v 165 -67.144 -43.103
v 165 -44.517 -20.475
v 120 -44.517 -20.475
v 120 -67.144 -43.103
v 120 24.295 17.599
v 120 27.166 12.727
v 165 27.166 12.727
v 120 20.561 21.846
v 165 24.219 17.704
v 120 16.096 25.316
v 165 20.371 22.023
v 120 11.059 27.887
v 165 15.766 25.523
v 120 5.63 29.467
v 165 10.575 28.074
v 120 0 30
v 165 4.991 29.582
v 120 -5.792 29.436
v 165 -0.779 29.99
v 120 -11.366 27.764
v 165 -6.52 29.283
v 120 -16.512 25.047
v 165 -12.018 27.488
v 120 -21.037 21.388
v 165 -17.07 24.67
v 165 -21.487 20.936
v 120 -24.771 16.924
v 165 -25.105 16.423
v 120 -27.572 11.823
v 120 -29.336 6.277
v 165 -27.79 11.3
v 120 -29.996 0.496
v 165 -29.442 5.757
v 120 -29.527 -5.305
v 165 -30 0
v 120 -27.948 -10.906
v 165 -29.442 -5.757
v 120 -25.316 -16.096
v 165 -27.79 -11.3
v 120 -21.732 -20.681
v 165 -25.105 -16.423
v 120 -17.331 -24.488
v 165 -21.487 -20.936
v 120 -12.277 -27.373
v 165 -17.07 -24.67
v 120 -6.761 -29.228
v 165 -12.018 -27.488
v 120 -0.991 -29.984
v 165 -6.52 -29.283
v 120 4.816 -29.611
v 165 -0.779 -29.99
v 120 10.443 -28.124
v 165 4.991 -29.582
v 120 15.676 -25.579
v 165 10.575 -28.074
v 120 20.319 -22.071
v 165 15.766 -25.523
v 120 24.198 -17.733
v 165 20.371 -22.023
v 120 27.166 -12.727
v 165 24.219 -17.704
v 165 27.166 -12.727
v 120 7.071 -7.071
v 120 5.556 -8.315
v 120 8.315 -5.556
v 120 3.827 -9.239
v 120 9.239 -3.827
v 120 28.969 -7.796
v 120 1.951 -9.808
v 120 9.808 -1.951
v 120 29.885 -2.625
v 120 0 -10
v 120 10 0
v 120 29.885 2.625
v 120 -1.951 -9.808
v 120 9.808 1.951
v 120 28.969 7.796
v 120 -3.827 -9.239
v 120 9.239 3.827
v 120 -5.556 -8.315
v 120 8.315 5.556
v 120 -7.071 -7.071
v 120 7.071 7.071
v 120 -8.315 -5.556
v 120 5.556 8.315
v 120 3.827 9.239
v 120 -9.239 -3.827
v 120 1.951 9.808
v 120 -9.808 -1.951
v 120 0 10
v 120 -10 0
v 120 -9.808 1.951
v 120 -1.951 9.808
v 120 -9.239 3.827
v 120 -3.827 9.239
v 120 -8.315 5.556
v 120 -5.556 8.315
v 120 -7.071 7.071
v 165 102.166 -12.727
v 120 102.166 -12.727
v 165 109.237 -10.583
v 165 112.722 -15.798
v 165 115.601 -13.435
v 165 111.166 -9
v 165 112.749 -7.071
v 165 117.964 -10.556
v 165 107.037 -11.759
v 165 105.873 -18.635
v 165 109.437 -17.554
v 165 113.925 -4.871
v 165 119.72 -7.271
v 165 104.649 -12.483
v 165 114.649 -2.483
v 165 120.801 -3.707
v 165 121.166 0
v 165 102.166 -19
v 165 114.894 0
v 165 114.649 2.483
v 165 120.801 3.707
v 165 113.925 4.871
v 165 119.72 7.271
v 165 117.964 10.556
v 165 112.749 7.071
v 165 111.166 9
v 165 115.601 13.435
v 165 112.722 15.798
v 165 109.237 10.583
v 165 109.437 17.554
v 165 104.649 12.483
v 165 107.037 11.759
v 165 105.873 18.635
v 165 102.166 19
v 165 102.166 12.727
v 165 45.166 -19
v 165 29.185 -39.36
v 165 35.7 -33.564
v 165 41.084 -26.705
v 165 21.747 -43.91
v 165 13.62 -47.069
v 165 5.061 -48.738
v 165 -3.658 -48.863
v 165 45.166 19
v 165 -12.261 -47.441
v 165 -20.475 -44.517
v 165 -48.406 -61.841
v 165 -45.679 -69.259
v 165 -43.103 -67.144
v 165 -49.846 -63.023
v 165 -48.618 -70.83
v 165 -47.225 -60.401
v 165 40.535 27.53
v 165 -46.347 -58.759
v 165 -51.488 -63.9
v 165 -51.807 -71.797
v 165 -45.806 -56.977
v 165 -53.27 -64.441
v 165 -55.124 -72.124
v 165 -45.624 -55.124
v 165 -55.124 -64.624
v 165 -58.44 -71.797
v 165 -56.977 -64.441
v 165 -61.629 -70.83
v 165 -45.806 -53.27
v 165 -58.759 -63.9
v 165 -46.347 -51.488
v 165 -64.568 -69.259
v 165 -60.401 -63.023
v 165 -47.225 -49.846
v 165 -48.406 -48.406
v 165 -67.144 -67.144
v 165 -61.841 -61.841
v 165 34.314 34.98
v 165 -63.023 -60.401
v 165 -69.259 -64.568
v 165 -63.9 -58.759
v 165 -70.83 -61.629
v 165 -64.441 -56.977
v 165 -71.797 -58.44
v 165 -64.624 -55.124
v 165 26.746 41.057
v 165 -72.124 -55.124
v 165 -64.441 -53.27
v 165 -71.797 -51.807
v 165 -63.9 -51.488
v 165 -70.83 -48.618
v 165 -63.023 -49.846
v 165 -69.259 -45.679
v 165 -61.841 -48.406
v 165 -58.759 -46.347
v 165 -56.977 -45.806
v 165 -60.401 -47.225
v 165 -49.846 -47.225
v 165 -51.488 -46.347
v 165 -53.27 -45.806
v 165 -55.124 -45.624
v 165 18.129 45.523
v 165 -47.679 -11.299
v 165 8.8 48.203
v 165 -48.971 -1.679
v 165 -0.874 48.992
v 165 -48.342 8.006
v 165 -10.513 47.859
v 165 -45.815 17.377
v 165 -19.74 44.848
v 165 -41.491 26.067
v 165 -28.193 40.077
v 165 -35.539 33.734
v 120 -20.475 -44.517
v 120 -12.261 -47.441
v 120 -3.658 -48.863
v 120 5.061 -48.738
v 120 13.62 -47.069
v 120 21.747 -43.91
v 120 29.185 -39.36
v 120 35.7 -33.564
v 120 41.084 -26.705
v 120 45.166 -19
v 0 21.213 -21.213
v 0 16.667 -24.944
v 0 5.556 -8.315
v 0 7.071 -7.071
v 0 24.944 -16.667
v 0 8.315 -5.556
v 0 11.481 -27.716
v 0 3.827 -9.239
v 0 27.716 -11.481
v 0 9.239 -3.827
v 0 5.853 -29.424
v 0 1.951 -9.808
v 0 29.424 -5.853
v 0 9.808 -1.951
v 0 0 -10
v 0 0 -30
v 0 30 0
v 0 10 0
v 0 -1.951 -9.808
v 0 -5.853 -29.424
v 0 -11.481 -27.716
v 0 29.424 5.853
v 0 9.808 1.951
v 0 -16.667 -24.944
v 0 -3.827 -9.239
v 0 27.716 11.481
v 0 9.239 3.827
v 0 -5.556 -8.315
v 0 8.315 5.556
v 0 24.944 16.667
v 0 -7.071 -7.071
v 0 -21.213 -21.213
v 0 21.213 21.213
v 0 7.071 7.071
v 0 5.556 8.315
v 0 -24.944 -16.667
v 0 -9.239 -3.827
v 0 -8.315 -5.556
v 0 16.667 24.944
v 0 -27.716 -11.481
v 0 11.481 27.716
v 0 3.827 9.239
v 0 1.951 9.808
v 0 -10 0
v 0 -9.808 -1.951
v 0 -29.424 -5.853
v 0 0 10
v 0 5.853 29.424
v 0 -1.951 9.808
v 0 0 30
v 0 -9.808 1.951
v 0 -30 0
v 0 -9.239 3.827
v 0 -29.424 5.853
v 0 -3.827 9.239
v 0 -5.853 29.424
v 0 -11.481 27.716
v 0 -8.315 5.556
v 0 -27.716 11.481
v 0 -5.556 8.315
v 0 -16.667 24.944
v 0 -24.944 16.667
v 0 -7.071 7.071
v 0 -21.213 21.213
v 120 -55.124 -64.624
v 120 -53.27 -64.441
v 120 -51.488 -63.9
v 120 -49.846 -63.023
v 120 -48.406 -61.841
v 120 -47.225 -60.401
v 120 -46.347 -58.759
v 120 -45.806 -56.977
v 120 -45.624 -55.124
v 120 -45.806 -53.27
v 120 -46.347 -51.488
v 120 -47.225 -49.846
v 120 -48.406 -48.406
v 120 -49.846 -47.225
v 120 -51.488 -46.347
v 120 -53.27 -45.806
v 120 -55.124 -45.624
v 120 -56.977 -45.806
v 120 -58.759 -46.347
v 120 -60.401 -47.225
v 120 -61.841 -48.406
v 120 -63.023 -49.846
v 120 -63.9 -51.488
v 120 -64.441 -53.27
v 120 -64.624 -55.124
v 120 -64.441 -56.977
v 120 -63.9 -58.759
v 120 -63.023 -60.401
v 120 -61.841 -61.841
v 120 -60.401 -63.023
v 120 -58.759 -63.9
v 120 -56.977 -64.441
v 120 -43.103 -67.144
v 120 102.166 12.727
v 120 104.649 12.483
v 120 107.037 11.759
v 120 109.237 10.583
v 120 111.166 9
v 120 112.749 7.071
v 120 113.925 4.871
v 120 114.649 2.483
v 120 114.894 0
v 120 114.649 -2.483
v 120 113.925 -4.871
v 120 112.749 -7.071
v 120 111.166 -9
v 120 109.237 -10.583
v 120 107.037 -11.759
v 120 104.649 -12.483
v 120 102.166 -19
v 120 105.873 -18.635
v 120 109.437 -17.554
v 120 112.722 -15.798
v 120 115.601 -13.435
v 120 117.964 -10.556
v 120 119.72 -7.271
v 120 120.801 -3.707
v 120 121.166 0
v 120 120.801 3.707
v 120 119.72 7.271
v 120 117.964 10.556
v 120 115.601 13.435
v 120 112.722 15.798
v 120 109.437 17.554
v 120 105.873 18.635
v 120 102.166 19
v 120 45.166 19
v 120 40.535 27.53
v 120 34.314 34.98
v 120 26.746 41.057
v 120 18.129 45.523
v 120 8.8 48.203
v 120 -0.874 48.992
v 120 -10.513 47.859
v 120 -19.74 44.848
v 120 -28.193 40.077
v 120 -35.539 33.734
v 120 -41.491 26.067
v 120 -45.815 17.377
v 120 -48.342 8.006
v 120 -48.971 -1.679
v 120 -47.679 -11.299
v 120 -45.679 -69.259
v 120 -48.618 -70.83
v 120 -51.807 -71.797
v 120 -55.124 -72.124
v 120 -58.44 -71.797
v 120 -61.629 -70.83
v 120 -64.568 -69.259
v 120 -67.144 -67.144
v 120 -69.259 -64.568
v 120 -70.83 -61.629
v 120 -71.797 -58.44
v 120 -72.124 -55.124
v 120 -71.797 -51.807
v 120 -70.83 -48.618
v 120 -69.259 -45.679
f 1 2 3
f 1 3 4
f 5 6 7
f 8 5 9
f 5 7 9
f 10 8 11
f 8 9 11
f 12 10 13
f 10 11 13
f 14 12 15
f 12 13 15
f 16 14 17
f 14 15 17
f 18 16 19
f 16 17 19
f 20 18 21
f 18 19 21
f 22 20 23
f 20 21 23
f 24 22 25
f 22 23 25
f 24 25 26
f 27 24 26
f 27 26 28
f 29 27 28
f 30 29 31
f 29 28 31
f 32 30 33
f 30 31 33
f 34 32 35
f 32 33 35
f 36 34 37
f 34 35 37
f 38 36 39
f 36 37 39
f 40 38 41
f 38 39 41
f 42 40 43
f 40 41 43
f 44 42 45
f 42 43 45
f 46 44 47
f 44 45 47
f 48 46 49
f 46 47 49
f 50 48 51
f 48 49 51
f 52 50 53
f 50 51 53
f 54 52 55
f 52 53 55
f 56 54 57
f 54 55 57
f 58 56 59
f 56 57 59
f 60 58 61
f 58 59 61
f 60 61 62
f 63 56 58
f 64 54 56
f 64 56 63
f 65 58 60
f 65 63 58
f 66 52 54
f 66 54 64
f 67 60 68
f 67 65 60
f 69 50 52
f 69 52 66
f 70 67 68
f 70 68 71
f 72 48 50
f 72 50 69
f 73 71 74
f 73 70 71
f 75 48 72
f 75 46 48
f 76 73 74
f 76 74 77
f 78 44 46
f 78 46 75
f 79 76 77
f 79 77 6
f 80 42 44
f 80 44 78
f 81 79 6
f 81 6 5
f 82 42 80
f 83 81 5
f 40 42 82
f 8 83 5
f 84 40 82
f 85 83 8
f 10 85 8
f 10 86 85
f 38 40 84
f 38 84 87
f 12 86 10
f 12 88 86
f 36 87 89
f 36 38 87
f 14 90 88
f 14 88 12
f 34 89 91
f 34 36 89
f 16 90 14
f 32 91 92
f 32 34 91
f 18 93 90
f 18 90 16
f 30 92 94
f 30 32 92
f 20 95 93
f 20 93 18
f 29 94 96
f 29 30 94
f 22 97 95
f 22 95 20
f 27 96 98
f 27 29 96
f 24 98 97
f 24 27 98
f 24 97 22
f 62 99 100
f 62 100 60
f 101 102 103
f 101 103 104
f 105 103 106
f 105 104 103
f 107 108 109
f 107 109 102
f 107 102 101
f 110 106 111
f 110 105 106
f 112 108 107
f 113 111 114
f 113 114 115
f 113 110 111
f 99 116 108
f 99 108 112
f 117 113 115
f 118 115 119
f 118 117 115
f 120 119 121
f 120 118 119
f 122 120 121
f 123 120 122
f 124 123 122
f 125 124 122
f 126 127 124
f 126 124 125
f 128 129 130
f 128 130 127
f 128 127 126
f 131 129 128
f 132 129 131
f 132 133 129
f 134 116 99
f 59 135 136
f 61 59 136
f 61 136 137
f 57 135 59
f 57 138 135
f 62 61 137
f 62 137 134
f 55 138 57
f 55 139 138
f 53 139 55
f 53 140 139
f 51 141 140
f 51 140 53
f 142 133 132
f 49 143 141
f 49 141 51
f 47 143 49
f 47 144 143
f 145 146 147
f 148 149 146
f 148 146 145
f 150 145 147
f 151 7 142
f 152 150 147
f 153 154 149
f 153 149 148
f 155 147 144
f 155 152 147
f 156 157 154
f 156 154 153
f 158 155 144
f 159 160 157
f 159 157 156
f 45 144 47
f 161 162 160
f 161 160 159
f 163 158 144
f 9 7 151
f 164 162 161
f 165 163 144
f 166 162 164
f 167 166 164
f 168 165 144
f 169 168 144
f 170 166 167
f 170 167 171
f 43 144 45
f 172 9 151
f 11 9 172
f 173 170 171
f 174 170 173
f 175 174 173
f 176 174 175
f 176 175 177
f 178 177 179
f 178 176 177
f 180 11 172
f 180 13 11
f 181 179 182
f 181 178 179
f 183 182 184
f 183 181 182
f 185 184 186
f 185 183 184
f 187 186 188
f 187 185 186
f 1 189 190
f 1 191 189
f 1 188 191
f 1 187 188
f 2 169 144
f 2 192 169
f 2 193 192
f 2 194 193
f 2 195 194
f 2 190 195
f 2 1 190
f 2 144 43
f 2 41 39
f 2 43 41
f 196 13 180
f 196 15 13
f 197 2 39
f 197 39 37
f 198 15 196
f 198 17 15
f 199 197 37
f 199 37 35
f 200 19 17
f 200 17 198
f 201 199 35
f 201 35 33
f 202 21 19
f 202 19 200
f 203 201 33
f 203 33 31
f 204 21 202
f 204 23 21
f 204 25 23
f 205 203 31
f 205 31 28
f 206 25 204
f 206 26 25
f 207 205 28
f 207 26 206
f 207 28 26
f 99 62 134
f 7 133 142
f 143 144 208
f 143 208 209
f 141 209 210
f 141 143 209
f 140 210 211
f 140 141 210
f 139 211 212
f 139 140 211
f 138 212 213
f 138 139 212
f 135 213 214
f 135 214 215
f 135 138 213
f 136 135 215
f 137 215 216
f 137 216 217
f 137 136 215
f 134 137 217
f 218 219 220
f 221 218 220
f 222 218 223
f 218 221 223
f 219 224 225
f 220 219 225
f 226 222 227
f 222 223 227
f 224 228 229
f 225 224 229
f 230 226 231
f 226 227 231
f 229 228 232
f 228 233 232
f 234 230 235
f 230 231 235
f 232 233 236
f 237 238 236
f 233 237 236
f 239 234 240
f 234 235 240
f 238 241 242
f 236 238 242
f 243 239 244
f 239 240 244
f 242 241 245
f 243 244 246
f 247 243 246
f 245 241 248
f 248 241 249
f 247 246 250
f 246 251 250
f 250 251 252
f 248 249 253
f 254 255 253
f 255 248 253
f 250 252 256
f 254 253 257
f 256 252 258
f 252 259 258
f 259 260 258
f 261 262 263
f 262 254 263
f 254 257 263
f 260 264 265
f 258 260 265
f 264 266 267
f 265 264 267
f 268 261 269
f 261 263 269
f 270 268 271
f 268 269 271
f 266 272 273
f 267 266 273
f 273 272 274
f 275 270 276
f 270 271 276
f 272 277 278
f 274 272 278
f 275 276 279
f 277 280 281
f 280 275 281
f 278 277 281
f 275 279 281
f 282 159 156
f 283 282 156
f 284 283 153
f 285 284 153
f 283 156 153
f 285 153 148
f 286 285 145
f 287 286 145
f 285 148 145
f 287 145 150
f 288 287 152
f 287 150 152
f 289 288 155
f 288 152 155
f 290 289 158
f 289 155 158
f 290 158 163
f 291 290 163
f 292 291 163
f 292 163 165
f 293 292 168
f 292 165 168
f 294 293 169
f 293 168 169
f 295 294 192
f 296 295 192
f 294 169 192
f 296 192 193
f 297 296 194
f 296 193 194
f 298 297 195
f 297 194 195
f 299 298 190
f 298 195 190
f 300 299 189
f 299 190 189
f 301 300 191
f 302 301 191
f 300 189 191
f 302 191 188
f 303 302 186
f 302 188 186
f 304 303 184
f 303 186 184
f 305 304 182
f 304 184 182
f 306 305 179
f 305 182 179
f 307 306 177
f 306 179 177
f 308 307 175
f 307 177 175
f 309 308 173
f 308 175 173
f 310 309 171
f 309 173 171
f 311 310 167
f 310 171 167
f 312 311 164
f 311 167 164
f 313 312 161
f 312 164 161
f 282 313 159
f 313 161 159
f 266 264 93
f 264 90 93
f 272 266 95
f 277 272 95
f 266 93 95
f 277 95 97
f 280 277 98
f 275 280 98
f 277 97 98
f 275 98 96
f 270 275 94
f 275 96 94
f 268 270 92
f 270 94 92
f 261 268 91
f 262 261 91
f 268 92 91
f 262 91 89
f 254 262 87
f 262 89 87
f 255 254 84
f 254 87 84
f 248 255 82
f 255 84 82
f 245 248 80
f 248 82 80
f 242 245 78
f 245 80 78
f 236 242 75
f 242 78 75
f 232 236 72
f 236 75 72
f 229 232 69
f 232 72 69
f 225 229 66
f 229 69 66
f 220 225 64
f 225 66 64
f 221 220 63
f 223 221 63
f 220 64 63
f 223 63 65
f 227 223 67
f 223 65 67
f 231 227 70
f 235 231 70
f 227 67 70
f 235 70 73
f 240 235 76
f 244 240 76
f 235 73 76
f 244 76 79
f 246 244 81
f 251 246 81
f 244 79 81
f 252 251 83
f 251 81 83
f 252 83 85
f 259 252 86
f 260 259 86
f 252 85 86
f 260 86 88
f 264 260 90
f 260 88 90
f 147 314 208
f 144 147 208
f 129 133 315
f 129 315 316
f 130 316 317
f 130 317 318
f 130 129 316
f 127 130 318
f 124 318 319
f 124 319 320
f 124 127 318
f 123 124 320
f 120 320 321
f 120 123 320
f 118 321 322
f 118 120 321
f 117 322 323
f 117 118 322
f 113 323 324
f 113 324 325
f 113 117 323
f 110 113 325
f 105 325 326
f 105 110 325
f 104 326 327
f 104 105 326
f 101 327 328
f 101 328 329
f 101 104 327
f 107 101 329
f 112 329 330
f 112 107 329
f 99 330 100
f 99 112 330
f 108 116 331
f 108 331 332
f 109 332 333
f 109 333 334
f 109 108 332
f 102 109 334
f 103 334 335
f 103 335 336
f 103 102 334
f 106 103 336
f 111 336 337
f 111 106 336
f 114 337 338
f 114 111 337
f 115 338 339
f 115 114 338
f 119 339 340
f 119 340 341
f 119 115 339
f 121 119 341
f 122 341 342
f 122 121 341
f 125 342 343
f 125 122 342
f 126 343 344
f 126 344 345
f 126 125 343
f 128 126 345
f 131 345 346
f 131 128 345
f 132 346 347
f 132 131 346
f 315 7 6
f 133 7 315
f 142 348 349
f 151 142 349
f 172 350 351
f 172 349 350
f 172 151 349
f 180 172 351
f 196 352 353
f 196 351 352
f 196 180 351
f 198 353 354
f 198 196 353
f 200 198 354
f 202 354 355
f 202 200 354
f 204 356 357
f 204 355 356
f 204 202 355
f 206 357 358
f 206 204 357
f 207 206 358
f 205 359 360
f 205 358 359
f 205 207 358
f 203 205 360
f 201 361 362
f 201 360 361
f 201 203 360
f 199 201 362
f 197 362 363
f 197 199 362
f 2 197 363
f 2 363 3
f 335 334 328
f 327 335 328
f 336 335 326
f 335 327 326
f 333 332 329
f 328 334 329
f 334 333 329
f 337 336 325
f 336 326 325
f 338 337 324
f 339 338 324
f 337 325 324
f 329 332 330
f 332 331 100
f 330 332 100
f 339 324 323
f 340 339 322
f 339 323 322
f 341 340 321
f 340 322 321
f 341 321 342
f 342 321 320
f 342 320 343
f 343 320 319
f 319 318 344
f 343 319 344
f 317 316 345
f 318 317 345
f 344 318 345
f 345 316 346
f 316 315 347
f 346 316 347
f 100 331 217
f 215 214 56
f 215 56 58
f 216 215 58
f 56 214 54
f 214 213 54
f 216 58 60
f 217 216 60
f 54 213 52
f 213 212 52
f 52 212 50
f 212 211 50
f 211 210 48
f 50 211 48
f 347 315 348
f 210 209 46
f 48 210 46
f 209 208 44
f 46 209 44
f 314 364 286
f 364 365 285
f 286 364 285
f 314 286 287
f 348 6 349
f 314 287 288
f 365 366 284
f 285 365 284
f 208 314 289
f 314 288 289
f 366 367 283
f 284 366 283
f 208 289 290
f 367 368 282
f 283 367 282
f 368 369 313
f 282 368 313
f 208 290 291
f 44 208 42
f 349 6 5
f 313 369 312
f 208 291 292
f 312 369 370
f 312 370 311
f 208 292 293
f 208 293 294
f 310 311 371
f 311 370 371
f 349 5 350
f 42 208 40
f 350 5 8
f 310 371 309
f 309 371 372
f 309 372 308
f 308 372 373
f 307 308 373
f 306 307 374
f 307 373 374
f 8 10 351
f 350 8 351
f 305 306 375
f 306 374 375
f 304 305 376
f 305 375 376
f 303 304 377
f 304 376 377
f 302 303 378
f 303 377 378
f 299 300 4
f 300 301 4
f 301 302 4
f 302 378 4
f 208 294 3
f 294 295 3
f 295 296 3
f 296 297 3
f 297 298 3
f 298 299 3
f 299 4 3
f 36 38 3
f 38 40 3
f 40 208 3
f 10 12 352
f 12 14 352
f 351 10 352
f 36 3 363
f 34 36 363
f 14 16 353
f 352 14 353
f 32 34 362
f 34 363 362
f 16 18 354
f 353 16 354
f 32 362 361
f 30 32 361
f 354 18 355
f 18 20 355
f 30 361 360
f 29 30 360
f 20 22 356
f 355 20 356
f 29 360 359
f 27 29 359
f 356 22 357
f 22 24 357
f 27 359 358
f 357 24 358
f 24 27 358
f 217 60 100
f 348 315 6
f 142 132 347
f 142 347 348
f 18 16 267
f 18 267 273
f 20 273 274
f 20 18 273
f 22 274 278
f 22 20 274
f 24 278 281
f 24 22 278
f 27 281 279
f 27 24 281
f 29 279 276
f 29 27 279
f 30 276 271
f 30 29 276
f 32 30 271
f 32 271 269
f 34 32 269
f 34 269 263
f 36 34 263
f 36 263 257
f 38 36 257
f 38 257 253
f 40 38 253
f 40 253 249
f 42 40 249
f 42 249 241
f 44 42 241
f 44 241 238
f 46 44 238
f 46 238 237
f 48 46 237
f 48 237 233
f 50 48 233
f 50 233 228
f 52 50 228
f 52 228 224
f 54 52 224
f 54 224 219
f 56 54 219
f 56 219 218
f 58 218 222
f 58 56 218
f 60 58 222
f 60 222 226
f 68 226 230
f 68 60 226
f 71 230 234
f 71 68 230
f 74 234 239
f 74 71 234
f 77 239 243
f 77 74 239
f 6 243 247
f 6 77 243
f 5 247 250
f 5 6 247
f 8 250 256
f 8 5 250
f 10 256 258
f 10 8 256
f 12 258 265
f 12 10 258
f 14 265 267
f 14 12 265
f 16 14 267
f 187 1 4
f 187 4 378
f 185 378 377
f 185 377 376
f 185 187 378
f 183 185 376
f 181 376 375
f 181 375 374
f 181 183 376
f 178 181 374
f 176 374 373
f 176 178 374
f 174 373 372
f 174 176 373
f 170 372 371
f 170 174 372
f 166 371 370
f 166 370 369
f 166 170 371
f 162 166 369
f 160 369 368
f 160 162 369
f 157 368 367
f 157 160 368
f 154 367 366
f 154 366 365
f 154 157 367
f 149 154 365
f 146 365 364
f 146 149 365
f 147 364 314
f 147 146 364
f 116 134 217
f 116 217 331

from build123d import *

# Parameters (mm, degrees)
SKETCH_1_W          = 120
SKETCH_1_H          = 20
SKETCH_1_W_2        = 45
SKETCH_1_H_2        = 19
SKETCH_2_R          = 9.5
EXTRUDE_1_DEPTH     = 45
CUT_EXTRUDE_1_DEPTH = 218.043995612


with BuildPart() as part:
    # Эскиз1 → Повернуть1 (revolve)
    with BuildSketch(Plane.XY, mode=Mode.PRIVATE) as revolve_1_sk:
        with Locations((60, -20)):
            Rectangle(SKETCH_1_W, SKETCH_1_H)
        with Locations((142.5, -39.5)):
            Rectangle(SKETCH_1_W_2, SKETCH_1_H_2)
    revolve(revolve_1_sk.sketch.rotate(Axis((0, 0, 0), (1, 0, 0)), 270), axis=Axis((0, 0, 0), (1, 0, 0)))

    # Эскиз2 → Бобышка-Вытянуть1 (add)
    # profile 1 of 2: a face of its own
    with BuildSketch(Plane(origin=(165, 0, 0), x_dir=(0, 0, -1), z_dir=(1, 0, 0))):
        with BuildLine():
            Line((-19, 102.166359163), (-19, 45.166359163))
            ThreePointArc((-19, 45.166359163), (-15.900187239, 46.348506403), (-12.727487177, 47.318189633))
            Line((-12.727487177, 47.318189633), (-12.727487177, 102.166359163))
            ThreePointArc((-12.727487177, 102.166359163), (0, 114.89384634), (12.727487177, 102.166359163))
            Line((12.727487177, 102.166359163), (12.727487177, 47.318189633))
            ThreePointArc((12.727487177, 47.318189633), (15.900187239, 46.348506403), (19, 45.166359163))
            Line((19, 45.166359163), (19, 102.166359163))
            ThreePointArc((19, 102.166359163), (0, 121.166359163), (-19, 102.166359163))
        make_face()
    # profile 2 of 2: a face of its own
    with BuildSketch(Plane(origin=(165, 0, 0), x_dir=(0, 0, -1), z_dir=(1, 0, 0))):
        with BuildLine():
            ThreePointArc((44.516968899, -20.475338338), (34.648232278, -34.648232278), (20.475338338, -44.516968899))
            Line((20.475338338, -44.516968899), (43.102755336, -67.144385897))
            ThreePointArc((43.102755336, -67.144385897), (67.144385897, -67.144385897), (67.144385897, -43.102755336))
            Line((67.144385897, -43.102755336), (44.516968899, -20.475338338))
        make_face()
        with Locations((55.123570617, -55.123570617)):
            Circle(SKETCH_2_R, mode=Mode.SUBTRACT)
    extrude(amount=-EXTRUDE_1_DEPTH)

    # Эскиз2<4> → Вырез-Вытянуть1 (cut, through all)
    with BuildSketch(Plane(origin=(165, 0, 0), x_dir=(0, 0, -1), z_dir=(1, 0, 0))):
        with BuildLine():
            ThreePointArc((12.727487177, 47.318189633), (0, 49), (-12.727487177, 47.318189633))
            Line((-12.727487177, 47.318189633), (-12.727487177, 27.166359163))
            ThreePointArc((-12.727487177, 27.166359163), (0, 30), (12.727487177, 27.166359163))
            Line((12.727487177, 27.166359163), (12.727487177, 47.318189633))
        make_face()
    extrude(amount=-CUT_EXTRUDE_1_DEPTH, mode=Mode.SUBTRACT)


solid = part.part
